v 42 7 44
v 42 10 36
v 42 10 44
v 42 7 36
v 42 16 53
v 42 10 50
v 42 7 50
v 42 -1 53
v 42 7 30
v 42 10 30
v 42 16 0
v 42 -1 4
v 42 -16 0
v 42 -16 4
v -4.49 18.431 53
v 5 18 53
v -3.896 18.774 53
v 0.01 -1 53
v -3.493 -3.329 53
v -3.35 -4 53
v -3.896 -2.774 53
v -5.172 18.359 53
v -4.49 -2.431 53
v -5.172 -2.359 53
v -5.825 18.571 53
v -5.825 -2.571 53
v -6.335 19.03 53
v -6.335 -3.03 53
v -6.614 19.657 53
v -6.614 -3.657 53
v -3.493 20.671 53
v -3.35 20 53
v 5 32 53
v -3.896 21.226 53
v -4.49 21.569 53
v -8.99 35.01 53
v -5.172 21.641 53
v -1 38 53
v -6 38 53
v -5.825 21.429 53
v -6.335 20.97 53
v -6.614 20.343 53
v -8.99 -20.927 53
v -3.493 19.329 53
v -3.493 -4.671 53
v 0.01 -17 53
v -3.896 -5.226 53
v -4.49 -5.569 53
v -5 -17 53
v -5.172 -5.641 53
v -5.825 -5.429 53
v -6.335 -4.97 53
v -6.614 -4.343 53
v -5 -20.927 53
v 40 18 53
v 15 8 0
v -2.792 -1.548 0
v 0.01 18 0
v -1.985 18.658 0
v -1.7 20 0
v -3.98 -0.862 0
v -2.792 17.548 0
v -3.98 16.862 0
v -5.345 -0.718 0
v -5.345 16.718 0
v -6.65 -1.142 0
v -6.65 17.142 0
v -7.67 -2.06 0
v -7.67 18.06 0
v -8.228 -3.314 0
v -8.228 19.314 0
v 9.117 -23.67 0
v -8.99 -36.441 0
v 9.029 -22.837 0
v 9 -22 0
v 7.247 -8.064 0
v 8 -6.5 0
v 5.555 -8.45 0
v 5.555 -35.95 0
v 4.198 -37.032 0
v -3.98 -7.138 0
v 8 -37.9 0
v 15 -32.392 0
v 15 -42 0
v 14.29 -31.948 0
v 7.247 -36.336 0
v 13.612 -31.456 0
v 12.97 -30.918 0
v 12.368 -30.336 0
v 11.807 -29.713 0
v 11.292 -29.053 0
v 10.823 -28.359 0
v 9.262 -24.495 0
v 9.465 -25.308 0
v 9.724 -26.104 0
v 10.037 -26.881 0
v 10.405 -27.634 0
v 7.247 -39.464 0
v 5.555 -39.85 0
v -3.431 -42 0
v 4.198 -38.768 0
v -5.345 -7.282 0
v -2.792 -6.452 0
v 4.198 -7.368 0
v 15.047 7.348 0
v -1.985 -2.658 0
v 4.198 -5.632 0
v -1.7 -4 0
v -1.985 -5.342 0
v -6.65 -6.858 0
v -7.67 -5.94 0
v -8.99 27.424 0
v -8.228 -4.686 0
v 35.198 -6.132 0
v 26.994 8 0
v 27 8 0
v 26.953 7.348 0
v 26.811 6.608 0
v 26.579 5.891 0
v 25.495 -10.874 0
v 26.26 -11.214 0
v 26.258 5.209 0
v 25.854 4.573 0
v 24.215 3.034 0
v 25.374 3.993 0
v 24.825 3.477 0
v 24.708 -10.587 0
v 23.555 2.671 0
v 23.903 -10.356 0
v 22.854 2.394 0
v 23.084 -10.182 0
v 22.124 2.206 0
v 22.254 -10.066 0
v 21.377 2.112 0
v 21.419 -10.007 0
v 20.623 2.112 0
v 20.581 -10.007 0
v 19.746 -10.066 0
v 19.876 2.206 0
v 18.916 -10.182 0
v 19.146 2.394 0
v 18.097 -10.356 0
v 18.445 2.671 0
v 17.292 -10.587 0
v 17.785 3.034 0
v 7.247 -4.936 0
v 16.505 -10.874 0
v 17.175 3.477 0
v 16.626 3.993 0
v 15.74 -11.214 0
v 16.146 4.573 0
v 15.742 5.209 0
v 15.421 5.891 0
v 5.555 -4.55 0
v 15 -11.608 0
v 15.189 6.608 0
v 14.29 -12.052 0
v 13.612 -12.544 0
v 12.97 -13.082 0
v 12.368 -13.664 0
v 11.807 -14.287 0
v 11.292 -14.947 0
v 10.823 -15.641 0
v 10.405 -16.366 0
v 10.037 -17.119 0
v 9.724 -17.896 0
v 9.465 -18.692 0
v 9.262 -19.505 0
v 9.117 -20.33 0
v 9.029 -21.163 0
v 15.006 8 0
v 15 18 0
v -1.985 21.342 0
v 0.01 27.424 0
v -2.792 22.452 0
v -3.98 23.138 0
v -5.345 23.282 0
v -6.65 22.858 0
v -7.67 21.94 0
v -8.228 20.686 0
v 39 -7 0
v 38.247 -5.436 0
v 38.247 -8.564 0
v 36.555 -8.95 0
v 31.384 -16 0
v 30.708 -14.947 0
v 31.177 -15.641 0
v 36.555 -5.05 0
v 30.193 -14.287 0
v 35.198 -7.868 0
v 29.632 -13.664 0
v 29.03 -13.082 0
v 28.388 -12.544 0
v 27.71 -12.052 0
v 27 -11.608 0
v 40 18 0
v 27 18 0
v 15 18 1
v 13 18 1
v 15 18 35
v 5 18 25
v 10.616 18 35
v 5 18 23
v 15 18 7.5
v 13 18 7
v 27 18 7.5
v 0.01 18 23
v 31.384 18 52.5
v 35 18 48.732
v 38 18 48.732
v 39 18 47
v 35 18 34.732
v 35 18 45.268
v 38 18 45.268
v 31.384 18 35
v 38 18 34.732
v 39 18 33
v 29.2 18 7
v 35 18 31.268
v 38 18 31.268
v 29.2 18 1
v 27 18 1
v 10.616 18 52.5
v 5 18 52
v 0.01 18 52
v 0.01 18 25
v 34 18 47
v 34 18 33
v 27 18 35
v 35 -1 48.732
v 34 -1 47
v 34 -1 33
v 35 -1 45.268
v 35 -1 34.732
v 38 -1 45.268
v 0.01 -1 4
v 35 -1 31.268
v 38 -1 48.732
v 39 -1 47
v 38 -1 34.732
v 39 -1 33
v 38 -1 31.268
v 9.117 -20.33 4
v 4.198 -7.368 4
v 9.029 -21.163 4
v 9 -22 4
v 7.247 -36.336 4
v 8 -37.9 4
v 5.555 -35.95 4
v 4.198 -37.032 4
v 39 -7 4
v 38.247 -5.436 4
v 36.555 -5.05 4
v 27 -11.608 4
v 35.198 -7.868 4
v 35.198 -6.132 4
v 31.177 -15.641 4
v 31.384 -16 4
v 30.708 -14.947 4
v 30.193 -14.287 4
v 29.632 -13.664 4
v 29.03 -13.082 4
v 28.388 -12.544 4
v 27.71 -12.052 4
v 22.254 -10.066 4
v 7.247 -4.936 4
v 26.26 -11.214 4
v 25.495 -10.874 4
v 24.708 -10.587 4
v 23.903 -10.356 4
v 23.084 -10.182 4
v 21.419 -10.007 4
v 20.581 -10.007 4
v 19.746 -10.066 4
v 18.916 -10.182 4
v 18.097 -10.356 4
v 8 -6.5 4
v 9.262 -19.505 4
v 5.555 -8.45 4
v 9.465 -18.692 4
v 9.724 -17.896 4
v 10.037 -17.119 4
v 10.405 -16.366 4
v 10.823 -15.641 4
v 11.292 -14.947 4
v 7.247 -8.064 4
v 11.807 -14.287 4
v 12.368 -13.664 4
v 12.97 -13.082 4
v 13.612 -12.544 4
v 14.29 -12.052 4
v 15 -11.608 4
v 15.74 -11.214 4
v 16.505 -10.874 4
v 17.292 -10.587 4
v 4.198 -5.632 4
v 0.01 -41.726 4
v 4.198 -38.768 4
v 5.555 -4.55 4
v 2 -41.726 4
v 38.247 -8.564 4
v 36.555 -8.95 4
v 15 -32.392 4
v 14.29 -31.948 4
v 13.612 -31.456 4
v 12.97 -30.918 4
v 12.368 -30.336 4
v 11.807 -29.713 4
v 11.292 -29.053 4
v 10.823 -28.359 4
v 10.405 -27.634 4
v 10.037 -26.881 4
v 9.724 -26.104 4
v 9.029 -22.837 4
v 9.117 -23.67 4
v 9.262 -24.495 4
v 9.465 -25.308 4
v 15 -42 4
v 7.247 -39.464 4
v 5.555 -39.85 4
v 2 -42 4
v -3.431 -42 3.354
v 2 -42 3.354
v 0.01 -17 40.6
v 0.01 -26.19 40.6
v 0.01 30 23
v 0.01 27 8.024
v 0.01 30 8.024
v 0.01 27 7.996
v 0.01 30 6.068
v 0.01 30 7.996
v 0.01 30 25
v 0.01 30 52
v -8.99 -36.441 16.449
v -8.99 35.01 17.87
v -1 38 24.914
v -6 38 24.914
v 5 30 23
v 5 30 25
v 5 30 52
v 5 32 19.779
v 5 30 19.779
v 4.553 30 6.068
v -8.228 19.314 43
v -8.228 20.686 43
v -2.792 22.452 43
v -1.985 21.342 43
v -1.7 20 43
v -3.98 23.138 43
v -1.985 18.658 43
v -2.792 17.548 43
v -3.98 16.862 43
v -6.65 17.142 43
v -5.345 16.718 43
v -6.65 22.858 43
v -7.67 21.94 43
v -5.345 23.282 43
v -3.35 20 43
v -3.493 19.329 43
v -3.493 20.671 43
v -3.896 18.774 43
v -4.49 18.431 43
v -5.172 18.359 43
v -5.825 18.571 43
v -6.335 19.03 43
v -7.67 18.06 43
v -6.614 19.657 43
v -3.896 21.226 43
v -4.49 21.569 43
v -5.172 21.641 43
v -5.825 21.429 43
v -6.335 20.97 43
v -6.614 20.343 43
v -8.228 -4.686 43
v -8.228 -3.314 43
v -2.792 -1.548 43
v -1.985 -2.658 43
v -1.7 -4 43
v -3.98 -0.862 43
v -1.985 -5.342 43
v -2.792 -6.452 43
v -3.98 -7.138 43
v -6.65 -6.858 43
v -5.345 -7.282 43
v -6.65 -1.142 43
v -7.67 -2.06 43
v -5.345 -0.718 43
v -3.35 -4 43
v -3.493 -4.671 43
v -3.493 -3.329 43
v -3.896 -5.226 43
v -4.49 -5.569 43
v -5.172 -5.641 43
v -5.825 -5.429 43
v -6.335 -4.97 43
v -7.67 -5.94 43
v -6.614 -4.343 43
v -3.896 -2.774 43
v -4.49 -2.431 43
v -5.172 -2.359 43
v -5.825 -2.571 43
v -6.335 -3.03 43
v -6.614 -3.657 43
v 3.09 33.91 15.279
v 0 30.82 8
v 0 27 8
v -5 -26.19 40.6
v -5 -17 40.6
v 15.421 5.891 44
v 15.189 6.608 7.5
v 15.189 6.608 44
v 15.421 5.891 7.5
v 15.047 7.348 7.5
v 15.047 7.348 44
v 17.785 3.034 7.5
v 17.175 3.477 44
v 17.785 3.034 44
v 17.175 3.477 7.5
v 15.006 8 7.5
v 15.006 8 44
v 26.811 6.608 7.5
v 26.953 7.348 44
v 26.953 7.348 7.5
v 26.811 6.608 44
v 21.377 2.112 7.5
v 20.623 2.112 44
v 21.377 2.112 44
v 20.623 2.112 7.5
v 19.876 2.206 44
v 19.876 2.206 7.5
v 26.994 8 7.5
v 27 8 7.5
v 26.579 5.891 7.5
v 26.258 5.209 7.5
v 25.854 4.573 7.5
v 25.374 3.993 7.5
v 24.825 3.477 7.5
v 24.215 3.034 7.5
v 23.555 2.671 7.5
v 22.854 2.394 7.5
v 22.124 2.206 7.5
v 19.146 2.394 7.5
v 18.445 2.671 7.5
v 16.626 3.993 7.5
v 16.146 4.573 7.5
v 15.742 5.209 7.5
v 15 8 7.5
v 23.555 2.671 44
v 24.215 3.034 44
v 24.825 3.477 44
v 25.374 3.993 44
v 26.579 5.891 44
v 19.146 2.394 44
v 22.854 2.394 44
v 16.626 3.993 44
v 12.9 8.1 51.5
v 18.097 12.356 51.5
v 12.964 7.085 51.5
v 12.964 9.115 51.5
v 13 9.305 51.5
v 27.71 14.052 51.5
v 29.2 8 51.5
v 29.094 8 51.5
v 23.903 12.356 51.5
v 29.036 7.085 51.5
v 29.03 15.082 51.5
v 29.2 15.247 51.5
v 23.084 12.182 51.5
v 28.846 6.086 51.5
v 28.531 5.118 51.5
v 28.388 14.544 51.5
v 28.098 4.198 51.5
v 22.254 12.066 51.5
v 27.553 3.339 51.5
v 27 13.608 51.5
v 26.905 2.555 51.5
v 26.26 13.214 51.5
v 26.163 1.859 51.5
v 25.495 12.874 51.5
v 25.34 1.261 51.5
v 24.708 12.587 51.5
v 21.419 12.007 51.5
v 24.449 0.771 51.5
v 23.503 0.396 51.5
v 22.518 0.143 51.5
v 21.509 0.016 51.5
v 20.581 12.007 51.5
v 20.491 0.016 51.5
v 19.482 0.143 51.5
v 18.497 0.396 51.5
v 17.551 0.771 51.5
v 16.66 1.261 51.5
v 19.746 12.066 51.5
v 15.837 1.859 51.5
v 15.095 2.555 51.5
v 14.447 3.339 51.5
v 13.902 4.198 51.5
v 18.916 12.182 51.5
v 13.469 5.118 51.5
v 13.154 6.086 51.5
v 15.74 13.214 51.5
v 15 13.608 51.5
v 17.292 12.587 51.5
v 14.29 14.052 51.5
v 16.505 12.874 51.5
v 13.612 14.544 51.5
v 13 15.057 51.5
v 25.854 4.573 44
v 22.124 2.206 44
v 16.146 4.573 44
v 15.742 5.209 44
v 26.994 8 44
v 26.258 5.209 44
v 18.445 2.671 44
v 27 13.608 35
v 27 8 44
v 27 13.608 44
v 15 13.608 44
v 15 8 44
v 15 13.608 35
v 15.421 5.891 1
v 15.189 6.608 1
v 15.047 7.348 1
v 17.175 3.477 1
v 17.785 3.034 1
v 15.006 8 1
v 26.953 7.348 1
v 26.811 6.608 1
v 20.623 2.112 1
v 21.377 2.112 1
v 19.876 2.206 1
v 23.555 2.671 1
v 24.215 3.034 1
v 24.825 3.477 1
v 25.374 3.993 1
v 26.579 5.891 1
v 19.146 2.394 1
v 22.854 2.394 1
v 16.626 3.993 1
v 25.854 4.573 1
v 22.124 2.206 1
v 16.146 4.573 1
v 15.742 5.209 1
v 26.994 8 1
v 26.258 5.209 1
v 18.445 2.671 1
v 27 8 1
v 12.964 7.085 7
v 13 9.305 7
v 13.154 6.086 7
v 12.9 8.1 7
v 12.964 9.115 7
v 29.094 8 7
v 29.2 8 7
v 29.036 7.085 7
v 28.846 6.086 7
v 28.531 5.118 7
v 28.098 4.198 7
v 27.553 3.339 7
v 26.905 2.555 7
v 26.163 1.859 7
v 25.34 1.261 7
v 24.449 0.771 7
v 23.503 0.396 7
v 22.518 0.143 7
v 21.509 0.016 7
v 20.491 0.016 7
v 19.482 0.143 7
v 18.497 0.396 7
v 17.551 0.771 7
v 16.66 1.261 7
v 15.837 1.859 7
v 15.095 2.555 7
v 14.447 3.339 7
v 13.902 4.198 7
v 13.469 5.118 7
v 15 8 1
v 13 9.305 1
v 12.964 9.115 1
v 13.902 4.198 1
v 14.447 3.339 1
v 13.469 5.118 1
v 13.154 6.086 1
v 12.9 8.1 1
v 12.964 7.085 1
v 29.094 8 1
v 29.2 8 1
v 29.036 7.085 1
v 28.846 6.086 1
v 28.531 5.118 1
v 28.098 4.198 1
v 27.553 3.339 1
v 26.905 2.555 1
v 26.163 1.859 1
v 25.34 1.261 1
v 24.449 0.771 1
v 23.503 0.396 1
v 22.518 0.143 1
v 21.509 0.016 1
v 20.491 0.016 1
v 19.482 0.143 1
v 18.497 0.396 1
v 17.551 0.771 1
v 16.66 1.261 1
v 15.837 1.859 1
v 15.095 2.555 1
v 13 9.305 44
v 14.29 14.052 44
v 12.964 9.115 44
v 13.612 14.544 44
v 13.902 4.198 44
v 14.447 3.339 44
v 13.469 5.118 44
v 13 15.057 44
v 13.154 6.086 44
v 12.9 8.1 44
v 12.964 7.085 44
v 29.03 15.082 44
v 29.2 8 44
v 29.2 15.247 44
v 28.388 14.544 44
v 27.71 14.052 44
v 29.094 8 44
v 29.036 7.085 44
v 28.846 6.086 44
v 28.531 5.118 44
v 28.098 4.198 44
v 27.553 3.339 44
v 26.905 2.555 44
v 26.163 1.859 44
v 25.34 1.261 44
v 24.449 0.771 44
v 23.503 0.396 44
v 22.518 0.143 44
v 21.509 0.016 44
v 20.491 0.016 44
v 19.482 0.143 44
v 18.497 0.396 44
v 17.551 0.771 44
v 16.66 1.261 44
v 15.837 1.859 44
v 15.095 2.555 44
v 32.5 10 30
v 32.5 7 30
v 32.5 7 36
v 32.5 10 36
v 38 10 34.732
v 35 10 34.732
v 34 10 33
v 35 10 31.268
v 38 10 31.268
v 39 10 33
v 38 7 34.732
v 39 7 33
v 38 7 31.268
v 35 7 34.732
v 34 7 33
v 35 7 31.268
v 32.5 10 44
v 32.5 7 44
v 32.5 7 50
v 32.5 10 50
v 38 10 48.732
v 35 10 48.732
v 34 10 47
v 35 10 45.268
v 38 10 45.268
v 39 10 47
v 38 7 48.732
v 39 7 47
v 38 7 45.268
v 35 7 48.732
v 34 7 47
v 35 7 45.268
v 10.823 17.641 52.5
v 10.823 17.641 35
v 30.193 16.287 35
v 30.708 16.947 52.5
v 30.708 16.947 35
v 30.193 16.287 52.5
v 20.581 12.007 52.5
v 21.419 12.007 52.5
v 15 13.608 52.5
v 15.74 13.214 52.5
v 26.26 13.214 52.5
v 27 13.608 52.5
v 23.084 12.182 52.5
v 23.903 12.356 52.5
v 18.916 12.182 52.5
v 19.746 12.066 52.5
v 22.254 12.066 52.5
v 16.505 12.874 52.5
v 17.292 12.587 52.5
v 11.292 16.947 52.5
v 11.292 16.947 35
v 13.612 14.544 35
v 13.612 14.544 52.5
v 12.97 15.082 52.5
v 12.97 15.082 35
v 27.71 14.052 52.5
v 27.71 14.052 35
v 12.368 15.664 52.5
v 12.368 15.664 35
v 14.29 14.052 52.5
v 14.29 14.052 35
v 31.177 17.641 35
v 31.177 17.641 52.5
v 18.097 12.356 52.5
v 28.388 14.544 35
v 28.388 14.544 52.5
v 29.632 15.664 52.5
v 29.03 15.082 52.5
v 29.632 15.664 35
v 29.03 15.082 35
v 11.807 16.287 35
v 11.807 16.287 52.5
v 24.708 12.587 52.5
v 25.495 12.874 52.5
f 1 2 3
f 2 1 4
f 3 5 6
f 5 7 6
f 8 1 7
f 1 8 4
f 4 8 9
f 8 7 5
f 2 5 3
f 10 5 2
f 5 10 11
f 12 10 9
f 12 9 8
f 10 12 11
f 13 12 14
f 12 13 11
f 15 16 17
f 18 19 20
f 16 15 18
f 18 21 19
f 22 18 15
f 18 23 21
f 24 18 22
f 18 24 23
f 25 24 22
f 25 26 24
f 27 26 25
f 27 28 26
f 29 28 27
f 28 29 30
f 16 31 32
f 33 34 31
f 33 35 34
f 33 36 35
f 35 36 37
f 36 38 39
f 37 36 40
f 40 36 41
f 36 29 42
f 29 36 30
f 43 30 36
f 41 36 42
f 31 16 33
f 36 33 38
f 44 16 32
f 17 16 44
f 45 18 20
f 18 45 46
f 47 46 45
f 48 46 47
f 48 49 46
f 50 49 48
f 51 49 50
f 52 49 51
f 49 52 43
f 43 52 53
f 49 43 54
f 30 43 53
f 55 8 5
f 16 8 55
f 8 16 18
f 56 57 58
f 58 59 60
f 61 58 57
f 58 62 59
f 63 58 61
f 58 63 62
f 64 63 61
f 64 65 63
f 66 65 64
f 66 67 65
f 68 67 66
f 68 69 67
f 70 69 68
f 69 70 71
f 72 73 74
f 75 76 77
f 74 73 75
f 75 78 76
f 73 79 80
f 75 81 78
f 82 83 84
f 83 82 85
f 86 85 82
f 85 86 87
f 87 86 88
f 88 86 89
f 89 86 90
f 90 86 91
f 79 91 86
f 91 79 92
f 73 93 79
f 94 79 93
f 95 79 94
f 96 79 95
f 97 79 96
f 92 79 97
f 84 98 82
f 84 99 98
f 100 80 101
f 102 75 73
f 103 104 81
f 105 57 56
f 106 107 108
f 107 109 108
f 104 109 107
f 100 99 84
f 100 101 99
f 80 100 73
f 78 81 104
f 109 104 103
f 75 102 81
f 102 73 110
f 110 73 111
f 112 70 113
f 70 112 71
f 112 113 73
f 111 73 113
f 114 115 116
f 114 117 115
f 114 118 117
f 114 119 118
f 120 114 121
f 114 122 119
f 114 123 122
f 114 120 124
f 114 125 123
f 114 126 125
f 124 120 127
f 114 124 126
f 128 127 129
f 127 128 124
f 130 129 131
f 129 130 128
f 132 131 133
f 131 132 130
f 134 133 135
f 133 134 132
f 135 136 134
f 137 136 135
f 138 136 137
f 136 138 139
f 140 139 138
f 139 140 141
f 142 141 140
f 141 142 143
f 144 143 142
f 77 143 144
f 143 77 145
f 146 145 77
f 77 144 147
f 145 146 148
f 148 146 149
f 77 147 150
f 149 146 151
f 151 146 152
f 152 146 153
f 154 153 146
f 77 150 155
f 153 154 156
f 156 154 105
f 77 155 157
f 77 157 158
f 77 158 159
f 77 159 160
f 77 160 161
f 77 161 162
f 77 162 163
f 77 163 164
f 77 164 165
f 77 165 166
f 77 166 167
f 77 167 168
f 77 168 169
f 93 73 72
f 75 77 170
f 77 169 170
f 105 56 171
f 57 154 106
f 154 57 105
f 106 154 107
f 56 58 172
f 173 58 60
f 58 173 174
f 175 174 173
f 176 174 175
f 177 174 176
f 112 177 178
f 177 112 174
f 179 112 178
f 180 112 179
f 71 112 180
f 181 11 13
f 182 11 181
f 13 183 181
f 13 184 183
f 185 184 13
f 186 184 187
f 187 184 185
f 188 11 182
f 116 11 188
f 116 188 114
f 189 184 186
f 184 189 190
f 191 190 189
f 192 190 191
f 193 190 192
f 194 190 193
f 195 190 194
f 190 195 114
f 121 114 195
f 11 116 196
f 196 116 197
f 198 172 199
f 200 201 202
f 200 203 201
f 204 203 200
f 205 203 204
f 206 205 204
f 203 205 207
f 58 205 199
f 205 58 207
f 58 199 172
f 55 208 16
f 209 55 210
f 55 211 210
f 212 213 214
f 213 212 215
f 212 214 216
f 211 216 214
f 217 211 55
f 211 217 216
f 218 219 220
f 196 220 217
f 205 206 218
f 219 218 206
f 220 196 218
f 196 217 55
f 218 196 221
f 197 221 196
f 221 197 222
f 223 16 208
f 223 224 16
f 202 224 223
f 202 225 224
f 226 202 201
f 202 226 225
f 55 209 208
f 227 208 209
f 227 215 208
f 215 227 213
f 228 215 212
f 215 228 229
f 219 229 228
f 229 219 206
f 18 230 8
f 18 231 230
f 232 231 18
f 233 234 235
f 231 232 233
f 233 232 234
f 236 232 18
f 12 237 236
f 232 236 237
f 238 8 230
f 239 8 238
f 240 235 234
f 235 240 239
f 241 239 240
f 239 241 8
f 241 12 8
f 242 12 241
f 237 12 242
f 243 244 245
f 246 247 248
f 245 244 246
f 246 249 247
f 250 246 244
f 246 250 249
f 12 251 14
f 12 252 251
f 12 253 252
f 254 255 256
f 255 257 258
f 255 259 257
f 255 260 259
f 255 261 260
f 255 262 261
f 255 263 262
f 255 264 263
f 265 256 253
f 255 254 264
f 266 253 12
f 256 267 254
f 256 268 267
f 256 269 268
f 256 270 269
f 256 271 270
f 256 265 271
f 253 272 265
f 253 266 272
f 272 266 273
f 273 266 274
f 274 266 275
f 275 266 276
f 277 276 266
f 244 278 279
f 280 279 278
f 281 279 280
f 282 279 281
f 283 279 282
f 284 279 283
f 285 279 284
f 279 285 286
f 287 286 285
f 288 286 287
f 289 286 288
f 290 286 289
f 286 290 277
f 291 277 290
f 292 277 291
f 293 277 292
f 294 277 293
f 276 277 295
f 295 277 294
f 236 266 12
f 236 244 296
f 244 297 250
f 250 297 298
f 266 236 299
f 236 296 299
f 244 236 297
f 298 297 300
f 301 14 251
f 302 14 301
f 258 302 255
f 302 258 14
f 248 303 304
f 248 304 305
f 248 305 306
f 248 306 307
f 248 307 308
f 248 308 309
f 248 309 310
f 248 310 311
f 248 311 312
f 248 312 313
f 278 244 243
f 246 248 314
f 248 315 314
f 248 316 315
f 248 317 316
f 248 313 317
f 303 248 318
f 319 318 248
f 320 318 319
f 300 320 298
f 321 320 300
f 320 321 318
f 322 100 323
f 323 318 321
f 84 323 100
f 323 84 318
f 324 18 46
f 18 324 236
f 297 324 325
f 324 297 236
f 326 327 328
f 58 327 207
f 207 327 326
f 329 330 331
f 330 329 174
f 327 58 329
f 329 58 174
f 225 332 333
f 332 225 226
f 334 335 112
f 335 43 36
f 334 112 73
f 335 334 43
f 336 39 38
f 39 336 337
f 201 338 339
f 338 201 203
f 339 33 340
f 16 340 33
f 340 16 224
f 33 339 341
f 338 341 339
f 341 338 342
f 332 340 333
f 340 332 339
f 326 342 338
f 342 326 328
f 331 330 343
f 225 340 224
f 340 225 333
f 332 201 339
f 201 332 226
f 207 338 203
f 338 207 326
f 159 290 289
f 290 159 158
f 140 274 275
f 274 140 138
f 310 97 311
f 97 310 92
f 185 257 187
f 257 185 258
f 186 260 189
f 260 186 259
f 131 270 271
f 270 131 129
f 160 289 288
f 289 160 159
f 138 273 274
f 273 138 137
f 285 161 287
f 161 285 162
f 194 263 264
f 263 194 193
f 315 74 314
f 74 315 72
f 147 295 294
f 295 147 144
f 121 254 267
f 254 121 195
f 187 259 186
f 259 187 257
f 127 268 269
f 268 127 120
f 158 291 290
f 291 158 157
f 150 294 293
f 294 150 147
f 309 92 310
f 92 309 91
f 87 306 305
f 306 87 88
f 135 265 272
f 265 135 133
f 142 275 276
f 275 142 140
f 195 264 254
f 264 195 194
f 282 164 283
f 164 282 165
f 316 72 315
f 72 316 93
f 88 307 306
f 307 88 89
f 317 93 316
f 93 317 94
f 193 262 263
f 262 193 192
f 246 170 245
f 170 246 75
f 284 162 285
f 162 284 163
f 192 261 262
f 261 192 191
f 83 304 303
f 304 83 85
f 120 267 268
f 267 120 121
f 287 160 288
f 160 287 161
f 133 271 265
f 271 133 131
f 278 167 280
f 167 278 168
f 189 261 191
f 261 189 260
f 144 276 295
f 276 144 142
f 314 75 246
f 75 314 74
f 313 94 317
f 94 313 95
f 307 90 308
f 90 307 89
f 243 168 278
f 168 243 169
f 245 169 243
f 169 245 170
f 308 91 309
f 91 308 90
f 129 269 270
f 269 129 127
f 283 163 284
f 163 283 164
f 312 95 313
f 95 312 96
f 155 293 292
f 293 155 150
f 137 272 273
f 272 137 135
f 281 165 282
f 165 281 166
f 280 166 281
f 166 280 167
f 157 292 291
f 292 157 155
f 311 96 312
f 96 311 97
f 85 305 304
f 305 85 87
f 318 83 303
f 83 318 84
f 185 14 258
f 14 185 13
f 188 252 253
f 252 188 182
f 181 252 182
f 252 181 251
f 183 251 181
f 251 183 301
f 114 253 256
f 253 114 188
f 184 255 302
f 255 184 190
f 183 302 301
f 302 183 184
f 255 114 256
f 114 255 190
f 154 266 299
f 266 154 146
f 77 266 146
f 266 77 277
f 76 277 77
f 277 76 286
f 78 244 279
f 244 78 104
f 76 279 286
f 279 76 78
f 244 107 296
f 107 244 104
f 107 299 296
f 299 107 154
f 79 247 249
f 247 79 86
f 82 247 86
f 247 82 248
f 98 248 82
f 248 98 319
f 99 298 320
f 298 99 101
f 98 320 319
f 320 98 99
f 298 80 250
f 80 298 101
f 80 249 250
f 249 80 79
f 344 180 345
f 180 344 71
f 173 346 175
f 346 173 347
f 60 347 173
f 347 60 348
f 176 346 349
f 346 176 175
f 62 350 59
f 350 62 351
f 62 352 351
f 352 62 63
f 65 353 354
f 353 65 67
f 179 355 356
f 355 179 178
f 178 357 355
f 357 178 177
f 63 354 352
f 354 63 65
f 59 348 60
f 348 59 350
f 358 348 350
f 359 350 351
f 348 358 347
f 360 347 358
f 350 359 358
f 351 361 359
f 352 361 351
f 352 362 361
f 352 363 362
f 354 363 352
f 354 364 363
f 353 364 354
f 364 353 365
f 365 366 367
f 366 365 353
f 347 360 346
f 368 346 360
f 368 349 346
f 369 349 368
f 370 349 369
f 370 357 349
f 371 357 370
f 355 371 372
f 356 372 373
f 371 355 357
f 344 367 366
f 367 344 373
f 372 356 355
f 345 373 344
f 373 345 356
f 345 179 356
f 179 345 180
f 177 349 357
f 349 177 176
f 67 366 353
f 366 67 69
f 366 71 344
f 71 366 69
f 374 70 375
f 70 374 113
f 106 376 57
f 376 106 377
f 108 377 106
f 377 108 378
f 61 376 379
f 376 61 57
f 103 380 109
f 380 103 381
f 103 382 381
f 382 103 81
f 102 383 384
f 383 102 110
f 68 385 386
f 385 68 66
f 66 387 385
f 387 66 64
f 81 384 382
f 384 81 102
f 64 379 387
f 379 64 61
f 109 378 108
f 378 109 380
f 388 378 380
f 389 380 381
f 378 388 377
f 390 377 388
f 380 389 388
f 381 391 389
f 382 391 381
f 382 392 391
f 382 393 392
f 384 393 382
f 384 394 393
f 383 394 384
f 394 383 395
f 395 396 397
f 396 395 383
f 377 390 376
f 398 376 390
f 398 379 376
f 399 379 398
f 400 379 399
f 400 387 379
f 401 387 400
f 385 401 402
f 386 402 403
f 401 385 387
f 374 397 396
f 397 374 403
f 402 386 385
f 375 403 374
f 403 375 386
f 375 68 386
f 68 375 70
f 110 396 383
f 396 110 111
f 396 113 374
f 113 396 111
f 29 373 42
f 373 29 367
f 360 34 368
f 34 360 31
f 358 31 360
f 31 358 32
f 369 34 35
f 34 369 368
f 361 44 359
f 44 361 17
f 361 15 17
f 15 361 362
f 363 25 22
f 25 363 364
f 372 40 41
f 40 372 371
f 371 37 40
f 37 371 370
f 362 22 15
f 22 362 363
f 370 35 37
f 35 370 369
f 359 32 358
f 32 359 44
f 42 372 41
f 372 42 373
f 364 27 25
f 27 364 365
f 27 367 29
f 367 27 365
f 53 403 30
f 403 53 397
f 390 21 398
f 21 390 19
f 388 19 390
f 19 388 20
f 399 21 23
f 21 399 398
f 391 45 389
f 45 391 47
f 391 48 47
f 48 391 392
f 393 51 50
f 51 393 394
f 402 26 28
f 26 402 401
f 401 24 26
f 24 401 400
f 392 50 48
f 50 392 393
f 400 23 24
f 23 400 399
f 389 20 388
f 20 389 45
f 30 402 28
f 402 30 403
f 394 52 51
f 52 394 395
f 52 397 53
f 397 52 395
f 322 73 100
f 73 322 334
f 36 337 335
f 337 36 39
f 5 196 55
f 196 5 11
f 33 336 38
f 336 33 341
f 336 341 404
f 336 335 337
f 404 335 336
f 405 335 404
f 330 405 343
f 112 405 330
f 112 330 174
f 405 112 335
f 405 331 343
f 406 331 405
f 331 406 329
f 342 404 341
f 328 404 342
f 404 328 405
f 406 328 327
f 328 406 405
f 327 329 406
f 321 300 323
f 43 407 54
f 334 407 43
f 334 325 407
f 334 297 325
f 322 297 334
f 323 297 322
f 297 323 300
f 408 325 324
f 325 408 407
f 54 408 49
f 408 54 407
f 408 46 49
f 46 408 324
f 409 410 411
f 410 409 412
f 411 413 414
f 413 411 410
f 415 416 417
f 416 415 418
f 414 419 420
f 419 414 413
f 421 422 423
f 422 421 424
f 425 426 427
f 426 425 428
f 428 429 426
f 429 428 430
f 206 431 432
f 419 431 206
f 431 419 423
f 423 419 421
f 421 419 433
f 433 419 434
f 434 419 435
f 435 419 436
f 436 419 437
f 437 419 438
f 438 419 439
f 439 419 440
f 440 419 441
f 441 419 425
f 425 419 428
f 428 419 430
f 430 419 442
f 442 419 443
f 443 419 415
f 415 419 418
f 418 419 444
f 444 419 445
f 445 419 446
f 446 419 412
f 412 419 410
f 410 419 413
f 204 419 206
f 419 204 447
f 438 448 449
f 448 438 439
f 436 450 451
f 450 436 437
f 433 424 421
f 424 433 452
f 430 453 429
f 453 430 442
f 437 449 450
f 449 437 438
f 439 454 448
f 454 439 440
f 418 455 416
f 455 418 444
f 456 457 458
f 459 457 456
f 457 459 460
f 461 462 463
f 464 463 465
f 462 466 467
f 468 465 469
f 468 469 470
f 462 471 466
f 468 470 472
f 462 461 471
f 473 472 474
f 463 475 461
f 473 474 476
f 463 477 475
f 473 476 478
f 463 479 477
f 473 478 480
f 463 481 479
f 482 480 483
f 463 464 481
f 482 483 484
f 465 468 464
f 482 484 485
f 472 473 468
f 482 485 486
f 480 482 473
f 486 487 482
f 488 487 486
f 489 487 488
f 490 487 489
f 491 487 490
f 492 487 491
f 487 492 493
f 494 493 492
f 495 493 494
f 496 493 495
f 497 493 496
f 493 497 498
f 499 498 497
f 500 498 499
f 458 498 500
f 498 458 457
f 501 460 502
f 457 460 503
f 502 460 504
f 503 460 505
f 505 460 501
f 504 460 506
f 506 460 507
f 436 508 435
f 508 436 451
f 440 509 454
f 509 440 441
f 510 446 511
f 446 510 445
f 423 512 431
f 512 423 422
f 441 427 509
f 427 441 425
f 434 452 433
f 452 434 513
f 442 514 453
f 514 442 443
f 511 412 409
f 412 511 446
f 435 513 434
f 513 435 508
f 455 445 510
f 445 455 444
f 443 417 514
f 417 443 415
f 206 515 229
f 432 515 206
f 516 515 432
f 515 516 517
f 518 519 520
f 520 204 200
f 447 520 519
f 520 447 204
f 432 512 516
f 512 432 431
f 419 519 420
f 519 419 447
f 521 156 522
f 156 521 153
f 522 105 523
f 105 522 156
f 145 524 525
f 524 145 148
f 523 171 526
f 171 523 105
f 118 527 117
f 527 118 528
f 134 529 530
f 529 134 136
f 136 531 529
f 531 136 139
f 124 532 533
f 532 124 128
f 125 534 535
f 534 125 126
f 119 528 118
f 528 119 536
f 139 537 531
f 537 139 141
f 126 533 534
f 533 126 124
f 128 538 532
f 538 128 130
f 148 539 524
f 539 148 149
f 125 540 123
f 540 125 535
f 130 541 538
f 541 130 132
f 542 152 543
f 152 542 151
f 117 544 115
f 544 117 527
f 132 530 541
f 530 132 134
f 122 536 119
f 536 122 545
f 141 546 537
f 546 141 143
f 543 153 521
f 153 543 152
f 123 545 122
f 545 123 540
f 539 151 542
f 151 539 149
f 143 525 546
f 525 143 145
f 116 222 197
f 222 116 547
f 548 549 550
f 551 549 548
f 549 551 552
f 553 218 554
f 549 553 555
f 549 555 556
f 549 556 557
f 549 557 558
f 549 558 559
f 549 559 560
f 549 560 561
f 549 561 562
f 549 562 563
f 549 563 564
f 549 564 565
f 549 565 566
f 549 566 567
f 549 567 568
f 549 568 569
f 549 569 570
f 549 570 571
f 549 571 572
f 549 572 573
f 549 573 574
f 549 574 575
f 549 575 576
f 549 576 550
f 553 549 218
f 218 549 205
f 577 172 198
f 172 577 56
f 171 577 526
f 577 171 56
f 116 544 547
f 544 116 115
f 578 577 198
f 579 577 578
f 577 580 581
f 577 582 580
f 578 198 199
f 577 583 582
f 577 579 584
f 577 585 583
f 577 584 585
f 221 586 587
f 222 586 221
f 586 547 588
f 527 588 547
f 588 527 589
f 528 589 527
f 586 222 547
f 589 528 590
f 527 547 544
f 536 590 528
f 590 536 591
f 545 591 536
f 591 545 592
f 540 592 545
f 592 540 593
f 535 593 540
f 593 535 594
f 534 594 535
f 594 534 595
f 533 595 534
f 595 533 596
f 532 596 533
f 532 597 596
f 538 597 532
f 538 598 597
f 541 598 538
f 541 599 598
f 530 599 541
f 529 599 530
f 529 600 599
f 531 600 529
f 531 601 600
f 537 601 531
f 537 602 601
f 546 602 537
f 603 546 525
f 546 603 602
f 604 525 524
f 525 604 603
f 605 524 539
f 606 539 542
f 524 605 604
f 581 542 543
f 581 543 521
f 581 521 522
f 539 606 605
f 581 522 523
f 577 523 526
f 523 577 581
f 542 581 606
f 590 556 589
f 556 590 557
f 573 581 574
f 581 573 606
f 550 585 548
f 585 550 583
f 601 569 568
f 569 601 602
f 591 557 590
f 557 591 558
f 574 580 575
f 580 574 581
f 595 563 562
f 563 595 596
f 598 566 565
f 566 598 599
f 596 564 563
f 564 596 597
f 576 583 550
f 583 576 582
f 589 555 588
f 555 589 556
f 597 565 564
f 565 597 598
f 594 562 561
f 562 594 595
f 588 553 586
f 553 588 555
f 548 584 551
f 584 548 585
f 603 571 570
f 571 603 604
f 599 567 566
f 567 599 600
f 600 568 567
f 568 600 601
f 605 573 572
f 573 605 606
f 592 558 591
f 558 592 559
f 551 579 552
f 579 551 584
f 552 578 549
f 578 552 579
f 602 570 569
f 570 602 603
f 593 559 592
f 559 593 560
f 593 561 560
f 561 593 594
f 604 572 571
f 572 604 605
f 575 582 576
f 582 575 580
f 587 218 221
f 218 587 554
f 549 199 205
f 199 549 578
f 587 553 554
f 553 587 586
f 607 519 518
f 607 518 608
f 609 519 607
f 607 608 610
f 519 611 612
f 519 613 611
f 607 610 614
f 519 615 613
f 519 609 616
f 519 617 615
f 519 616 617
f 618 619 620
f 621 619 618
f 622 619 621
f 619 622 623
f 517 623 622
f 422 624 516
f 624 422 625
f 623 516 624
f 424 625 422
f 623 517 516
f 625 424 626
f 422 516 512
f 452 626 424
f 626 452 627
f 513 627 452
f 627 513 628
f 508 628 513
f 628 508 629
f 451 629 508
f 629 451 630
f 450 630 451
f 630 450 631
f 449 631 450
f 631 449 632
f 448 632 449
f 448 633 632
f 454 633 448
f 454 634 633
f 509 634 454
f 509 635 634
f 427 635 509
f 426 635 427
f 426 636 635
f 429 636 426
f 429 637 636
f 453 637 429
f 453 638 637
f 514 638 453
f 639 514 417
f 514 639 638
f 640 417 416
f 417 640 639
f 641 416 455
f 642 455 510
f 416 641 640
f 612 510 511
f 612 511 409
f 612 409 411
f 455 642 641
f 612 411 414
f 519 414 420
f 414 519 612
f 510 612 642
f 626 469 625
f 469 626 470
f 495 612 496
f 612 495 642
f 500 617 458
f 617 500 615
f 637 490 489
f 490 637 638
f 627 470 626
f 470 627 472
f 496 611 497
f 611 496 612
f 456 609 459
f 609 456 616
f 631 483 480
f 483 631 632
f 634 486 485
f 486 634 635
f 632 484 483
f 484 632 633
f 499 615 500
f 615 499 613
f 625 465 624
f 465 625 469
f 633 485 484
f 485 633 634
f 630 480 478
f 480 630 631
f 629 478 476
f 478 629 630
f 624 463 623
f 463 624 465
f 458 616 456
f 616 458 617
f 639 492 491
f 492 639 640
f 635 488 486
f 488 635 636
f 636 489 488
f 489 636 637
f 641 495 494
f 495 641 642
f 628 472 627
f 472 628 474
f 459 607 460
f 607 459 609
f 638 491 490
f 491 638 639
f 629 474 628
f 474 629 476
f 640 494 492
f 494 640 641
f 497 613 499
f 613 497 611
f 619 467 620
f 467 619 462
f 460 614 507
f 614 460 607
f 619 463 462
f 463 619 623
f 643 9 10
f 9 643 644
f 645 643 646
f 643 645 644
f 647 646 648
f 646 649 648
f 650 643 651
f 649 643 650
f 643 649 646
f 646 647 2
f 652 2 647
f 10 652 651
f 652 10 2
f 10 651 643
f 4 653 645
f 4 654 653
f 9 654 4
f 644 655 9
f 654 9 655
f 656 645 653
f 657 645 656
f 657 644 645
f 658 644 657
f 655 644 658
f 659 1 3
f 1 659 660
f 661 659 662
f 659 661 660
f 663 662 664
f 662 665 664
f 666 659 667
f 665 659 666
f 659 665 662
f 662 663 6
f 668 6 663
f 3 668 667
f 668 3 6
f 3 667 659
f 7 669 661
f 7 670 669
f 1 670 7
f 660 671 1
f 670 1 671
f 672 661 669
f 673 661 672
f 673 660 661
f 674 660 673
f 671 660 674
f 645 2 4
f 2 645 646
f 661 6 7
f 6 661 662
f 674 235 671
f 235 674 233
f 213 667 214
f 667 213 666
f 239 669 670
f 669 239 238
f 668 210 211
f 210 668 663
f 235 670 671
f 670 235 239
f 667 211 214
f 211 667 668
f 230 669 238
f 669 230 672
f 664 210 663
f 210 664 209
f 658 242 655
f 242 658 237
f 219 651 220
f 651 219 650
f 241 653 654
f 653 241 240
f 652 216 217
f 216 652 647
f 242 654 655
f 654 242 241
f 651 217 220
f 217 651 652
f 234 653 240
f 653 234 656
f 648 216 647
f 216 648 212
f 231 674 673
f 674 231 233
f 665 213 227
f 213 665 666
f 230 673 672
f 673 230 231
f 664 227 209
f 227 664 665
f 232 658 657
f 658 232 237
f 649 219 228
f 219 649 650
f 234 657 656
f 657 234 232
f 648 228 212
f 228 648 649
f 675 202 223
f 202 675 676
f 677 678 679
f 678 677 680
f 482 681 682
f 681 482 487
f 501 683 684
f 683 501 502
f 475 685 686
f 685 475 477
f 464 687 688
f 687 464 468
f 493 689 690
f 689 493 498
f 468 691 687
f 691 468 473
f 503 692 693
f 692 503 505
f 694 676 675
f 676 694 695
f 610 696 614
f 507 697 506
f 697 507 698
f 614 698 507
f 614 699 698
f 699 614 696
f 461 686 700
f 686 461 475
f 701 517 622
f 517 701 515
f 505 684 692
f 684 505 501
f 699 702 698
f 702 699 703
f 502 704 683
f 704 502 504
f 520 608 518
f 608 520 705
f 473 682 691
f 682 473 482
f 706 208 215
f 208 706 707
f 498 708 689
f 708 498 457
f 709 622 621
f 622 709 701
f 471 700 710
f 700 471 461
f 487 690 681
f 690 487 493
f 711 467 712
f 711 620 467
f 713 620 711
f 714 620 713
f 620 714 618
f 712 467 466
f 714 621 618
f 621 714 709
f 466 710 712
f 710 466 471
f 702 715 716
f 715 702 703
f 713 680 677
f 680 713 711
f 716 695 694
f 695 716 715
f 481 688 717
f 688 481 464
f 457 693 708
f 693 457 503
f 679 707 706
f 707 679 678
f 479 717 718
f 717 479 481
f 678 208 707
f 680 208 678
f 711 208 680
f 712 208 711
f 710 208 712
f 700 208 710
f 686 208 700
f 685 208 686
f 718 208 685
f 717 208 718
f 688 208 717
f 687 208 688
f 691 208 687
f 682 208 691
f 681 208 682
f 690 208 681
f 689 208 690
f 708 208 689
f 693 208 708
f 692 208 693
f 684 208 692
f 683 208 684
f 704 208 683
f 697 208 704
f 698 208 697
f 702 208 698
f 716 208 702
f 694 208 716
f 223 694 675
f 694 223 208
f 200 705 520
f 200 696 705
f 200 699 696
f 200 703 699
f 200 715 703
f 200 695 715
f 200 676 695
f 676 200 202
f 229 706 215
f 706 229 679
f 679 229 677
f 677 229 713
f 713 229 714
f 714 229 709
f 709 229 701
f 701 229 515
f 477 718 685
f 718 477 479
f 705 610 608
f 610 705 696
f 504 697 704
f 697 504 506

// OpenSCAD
// PRUSA iteration3
// NEMA 17 extruder body
// GNU GPL v3
// Josef Průša <iam@josefprusa.cz>, Kliment Yanev and contributors
// http://www.reprap.org/wiki/Prusa_Mendel
// http://prusamendel.org

module nozzlemount(){
	// Filament hole	
	rotate([0,90,0]) cylinder(r=2, h=70, $fn=30);

	// Tapered filament intake after the drive gear
	translate([17,0,0]) rotate([0,90,0]) cylinder(r2=3,r1=2, h=10, $fn=30);

	translate([1,0,0]) rotate([0,90,0]) cylinder(r=8, h=1);

	// Front nozzle mount hole
	translate([0,15,0]) rotate([0,90,0]) cylinder(r=2, h=70);

	// Front nozzle mount hole NUT TRAP
	translate([10-5,15,0]) rotate([0,90,0]) rotate([0,0,30]) cylinder(r=3.3, h=70,$fn=6);

	// Back nozzle mount hole
	translate([0,-25,0]) rotate([0,90,0]) cylinder(r=2, h=70);

	// Back nozzle mount hole NUT TRAP
	translate([10-5,-25,0]) rotate([0,90,0]) rotate([0,0,30])cylinder(r=3.3, h=70,$fn=6);
}

//<<<<<<< HEAD
motor_lenght = 49;


// Calculated values

	// Total height of the part is motor lenght plus front plate
	total_height = motor_lenght + 4;

difference(){
union(){
	// Base where drive gear is placed
	translate([0,-1,0])cube([42,19,total_height]);
//<<<<<<< HEAD

	// Front plate (where motor mount is cutout)
	translate([0,-42,0]) cube([42,42+3,4]);

	// Base plate (nozzle is secured to it)
	translate([-8.99,-42,0]) cube([9,80,total_height]);

	// IDLER retainer
	translate([-1,30,0]) cube([6, 7, total_height]);

		// Top bridge holding idler retainer form springing
		translate([-1,15,total_height-1]) cube([6, 20, 1]);

		// Bottom bridge holding idler retainer form springing
		translate([-1,15,total_height-30]) cube([6, 20, 2]);
}

//Pretty corners

	// Cutaway corner base plate (motor side)
	translate([-11,-91,-1])rotate([0,0,45])cube([40,40,60]);
	// Cutaway corner base plate (idler side)
	translate([-32,12,-1])rotate([0,0,45])cube([40,40,60]);

	// Cutaway corner base block (idler side)
	translate([46,12,-1])rotate([0,0,45])cube([40,40,60]);

	// Cutaway corner idler retainer
	translate([6,31,-1])rotate([0,0,45])cube([40,40,60]);

// Pretty cutouts
	// Idler retainer pretty cuts
	translate([-10,27,-0+(total_height-54)]) rotate([-23,0,0]) cube([20,12,50]);
	translate([0,27,7+(total_height-52)]) rotate([0,23,0]) cube([20,12,50]);

	// Base plate pretty cut
	translate([-10,-66,-2]) rotate([-23,0,0]) cube([12,20,90]);

// Motor mount
translate([0,-1,0.5]){

	// Motor axis circle cut
	translate([21,-21,-1]) cylinder(r=12, h=5, $fn=90);

	// Material and warp saving cut
	translate([15,-45,-1]) cube([30,30,5]);

	// Motor screw holes
	translate([21+16,-21+15,-1]) cylinder(r=2, h=5);
	translate([21-15,-21+15.5,-1]) cylinder(r=2, h=5);
	translate([21-15,-21-15.9,-1]) cylinder(r=2, h=5);

//translate([21+15.5,-21+15.5,-1]) cylinder(r=2, h=5);
//translate([21+15.5,-21-15.5,-1]) cylinder(r=2, h=5);
//translate([21-15.5,-21+15.5,-1]) cylinder(r=2, h=5);
//translate([21-15.5,-21-15.5,-1]) cylinder(r=2, h=5);
}

// Motor cables hole
translate([-5,-35,40.6]) cube([15,18,13]);



// Shaft cutouts

	// Main shaft cylinder cut
	translate([21,8.1,7.5]) cylinder(r=6, h=total_height-9, $fn=50);
	// Main shaft box cut
	translate([-6+21,8,7.5]) cube([12,12,total_height-12]);

	// Entry main shaft cylinder cut
	translate([21,8.1,-1]) cylinder(r=6, h=3, $fn=50);
	// Entry main shaft box cut
	translate([-6+21,8,-50+7]) cube([12,12,50]);

	// Front axis bearing cylinder cut
	translate([21,8.1,1]) cylinder(r=8.1, h=6, $fn=50);
	// Front axis bearing box cut
	translate([13,8,1]) cube([16.2,20,6]);

	// Back axis bearing cylinder cut
	translate([21,8.1,-5+total_height-4]) cylinder(r=8.1, h=7.5, $fn=50);
	// Back axis bearing box cut
	translate([13,8,total_height-9]) cube([16.2,20,7.5]);


// X-carriage mounting holes
translate([-5,20,0]){
	translate([0,0,-1])rotate([0,0,0])cylinder(r=3.3, h=total_height-10+1, $fn=15);
	translate([0,0-24,-1])rotate([0,0,0])cylinder(r=3.3, h=total_height-10+1, $fn=15);
	translate([0,0,total_height-22])rotate([0,0,0])cylinder(r=3.3/2, h=70, $fn=15);
	translate([0,0-24,total_height-22])rotate([0,0,0])cylinder(r=3.3/2, h=70, $fn=15);
}

	translate([32.5,7,52-12-7-3]) cube([15,3,5.7]);
	// Back idler screw nut trap
	translate([32.5,7,52-12-7-3+14]) cube([15,3,5.7]);
	translate([32.5,7,52-12-7-3]) cube([15,3,6]);
	// Back idler screw nut trap
	translate([32.5,7,52-12-7-3+14]) cube([15,3,6]);

	// Back top idler screw hole
	translate([5+32,-1,52-12+7]) rotate([0,90,90]) rotate([0,0,30]) cylinder(r=2, h=40, $fn=6);
	// Back bottom idler screw hole
	translate([5+32,-1,52-12-7]) rotate([0,90,90]) rotate([0,0,30]) cylinder(r=2, h=40, $fn=6);
	// Front top idler screw hole
	translate([5+31,-1,52-12+7]) rotate([0,90,90]) rotate([0,0,30]) cylinder(r=2, h=40, $fn=6);
	// Front bottom idler screw hole
	translate([5+31,-1,52-12-7]) rotate([0,90,90]) rotate([0,0,30]) cylinder(r=2, h=40, $fn=6);

	// Idler 608 bearing cutout
	translate([21,24,35]) cylinder(r=12, h=17.5, $fn=90);


}
